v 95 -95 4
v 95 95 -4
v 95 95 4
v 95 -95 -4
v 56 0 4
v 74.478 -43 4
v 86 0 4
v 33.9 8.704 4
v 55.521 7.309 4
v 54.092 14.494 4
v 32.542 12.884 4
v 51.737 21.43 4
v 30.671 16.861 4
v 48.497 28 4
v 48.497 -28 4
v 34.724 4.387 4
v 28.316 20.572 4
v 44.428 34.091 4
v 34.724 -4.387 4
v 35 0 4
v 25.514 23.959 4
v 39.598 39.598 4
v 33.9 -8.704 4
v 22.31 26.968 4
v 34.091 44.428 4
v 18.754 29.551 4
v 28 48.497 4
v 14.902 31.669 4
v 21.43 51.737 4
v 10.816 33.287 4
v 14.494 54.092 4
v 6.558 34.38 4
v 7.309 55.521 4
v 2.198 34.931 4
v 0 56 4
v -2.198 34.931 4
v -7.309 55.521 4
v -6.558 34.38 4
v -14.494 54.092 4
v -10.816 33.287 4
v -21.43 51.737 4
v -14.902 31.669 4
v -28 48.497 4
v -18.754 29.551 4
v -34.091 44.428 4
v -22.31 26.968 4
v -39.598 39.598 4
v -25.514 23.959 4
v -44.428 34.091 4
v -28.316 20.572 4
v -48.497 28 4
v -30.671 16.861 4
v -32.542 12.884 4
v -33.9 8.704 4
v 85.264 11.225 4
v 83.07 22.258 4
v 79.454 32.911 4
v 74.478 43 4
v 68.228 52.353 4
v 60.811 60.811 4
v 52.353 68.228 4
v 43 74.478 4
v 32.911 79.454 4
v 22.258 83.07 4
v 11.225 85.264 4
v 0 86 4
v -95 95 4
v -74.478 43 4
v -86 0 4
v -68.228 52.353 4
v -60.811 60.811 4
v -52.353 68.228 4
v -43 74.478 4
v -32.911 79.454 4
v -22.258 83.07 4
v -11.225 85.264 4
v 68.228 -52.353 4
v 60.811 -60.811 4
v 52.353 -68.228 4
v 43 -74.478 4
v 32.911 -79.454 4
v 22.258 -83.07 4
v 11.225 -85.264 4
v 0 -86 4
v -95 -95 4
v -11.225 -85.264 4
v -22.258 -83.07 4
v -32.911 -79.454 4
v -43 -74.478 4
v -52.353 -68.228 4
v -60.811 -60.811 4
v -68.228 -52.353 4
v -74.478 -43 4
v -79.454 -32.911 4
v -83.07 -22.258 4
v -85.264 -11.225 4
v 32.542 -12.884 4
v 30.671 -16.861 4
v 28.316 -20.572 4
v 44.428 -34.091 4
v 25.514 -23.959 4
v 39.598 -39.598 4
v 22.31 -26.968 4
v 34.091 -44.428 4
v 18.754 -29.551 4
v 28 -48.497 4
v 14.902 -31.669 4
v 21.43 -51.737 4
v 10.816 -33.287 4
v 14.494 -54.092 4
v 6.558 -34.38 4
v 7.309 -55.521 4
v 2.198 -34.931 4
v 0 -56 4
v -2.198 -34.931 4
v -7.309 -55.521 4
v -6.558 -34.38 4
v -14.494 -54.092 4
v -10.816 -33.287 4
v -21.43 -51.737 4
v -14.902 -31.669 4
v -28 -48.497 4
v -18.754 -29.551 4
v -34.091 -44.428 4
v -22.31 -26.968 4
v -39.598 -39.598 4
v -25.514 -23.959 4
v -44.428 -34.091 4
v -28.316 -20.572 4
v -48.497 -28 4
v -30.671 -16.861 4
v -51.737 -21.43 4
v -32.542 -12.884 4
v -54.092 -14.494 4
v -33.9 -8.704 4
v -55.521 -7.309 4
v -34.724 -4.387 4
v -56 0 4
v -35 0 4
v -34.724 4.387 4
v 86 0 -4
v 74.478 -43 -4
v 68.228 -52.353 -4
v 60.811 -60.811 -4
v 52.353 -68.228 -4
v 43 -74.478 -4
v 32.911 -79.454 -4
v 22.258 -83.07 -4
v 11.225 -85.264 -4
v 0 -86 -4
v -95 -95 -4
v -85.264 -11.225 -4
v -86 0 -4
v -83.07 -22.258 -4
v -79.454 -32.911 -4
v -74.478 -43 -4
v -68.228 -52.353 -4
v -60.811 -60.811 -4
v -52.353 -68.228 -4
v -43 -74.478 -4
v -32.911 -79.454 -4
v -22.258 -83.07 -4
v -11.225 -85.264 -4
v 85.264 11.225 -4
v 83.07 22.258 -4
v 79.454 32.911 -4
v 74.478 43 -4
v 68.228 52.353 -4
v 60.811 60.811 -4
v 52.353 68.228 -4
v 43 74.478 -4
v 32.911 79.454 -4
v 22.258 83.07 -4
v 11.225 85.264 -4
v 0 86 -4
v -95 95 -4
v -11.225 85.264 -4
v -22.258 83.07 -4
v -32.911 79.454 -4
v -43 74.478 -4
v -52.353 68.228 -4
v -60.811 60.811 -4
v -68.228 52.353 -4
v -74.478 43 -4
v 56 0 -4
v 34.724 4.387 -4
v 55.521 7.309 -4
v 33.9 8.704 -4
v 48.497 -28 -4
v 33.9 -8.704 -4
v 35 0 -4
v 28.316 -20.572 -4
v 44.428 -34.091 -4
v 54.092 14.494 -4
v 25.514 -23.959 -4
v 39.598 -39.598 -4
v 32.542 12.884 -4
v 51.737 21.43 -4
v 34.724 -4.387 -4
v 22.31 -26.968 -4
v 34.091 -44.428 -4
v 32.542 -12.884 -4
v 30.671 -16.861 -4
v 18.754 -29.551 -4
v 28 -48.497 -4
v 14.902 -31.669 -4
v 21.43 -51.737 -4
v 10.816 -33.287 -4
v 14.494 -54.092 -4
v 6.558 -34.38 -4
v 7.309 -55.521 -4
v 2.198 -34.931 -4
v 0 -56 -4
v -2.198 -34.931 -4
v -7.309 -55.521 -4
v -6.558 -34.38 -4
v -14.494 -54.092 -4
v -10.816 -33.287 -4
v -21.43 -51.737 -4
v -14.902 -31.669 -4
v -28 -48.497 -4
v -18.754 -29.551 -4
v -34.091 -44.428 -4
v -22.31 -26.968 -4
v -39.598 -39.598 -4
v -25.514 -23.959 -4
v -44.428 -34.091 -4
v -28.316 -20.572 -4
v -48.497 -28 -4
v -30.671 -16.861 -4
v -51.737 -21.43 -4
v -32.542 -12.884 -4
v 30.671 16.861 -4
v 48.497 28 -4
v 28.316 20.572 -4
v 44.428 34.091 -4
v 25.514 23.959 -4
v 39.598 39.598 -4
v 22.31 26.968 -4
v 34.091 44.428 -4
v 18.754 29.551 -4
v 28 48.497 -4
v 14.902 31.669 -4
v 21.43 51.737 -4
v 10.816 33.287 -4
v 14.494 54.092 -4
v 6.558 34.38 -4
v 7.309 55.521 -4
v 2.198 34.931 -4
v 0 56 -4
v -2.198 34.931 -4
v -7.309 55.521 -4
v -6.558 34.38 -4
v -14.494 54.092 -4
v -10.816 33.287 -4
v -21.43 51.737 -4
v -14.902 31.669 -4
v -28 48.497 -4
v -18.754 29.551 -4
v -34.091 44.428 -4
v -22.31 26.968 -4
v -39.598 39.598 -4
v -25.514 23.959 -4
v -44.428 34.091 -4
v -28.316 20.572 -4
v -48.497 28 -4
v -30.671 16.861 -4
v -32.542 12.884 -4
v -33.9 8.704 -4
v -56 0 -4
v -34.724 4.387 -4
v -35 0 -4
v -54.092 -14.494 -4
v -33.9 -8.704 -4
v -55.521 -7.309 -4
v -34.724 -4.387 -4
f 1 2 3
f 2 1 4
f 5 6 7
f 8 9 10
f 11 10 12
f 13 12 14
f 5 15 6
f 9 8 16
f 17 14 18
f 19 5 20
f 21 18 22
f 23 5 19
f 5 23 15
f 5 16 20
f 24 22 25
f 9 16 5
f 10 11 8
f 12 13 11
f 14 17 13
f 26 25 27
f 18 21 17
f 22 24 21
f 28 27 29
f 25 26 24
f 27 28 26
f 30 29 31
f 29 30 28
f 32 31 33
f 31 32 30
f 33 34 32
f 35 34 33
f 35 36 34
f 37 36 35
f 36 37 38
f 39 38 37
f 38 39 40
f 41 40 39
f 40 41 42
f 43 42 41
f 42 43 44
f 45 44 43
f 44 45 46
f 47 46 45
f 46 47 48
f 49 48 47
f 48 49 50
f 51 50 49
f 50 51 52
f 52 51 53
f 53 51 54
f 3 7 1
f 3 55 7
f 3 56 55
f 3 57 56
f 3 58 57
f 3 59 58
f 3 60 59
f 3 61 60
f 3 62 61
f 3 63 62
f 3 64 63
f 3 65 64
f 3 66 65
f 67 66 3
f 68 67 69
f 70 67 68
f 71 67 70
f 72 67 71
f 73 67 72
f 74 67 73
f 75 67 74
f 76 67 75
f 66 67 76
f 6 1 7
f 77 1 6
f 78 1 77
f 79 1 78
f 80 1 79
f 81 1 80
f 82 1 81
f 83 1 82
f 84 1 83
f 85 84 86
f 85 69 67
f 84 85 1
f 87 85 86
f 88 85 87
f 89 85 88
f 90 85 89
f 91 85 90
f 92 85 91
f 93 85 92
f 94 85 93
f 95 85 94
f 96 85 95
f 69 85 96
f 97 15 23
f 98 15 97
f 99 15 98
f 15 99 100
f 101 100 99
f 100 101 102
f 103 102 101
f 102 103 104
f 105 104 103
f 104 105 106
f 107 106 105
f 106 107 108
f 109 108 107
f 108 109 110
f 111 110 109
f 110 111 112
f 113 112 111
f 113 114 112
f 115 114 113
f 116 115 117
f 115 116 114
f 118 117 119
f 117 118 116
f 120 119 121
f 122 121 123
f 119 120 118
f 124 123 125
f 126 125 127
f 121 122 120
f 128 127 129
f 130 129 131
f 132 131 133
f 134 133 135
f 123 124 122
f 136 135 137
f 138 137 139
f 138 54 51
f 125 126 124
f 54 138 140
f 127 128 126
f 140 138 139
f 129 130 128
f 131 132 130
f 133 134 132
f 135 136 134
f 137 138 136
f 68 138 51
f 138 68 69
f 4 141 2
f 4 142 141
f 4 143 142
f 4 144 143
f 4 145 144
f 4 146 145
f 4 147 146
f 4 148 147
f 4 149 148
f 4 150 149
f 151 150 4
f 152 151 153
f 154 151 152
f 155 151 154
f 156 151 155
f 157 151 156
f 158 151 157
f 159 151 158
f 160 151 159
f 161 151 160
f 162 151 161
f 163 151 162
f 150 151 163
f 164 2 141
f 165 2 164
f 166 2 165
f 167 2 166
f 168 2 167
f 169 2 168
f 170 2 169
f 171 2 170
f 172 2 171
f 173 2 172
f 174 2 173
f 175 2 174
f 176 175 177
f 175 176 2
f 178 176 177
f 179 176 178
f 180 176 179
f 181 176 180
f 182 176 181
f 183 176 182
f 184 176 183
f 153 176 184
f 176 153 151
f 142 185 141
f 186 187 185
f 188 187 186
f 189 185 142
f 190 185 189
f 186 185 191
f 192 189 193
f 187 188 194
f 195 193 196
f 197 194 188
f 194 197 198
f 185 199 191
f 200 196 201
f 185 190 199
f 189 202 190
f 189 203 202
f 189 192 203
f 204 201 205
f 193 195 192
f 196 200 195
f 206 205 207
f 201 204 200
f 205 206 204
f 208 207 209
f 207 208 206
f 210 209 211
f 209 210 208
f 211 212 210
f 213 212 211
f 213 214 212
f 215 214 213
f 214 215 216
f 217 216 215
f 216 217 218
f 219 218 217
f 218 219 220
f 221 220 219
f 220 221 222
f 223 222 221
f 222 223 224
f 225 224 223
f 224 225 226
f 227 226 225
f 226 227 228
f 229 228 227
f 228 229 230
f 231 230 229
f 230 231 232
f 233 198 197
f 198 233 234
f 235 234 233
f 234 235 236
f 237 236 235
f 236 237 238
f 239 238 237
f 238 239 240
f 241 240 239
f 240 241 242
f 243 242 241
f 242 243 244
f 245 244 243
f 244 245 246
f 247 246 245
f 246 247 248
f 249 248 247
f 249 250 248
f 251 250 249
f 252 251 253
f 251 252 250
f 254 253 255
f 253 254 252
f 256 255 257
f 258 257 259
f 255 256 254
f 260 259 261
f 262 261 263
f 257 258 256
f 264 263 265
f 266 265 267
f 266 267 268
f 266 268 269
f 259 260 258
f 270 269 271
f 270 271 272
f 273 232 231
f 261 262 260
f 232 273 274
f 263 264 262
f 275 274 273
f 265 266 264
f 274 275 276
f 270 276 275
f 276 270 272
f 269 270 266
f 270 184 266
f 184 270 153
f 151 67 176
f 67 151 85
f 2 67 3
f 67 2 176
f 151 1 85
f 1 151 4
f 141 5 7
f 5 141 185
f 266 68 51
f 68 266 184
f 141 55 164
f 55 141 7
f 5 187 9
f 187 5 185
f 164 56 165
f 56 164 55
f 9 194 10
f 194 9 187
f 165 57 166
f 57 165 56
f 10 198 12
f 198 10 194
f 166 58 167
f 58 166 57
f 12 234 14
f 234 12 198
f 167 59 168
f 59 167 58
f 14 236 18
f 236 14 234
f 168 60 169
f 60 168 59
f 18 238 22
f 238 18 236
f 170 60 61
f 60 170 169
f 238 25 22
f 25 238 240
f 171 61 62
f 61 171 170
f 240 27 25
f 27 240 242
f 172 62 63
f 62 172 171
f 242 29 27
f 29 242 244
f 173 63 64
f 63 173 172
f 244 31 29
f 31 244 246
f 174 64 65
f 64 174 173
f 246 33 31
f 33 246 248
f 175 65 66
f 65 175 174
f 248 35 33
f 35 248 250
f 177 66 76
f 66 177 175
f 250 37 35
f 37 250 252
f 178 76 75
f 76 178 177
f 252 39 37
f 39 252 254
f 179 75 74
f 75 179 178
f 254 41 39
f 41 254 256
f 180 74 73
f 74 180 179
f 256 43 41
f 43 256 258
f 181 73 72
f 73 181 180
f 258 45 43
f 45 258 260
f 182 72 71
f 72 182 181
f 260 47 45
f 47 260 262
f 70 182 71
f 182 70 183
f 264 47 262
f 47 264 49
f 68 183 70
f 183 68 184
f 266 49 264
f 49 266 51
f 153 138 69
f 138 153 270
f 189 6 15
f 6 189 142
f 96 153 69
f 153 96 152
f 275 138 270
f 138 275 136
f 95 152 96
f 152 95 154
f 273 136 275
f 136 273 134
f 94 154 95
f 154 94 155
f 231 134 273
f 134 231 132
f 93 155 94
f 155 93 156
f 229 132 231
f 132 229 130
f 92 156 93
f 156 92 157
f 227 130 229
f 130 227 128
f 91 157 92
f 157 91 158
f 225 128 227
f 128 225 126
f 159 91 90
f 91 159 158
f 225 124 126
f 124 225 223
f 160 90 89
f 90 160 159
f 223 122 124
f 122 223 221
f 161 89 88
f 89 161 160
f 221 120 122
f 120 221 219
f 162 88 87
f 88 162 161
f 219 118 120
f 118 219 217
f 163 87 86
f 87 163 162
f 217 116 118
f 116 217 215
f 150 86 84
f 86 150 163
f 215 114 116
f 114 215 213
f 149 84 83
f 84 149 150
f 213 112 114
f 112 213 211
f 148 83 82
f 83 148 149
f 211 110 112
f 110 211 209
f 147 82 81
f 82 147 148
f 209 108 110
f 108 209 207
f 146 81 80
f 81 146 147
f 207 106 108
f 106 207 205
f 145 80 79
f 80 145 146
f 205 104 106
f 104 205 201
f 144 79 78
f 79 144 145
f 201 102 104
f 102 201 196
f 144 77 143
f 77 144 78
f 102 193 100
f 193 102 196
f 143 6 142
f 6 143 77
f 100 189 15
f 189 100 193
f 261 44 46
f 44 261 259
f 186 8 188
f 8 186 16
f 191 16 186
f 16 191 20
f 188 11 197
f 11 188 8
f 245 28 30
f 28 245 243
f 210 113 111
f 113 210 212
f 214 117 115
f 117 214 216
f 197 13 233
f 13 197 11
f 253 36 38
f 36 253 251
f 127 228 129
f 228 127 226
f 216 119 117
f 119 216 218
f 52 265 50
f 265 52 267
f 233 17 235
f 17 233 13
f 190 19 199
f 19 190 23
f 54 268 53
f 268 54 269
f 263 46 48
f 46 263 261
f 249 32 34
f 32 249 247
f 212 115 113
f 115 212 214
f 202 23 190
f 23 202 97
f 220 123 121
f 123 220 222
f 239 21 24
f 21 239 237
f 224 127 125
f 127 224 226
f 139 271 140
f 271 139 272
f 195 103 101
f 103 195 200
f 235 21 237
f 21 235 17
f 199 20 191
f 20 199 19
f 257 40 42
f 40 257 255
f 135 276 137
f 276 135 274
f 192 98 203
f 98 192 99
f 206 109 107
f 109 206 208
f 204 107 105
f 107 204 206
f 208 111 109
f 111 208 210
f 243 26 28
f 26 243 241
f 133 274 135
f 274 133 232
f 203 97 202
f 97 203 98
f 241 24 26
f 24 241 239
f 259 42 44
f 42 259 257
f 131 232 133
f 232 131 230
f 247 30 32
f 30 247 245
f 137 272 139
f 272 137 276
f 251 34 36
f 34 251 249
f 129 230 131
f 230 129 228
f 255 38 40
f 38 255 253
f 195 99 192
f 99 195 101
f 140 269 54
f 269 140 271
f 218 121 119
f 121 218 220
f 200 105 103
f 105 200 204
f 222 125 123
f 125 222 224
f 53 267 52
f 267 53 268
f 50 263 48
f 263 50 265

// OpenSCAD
thickness = 8;
inner_diameter = 150;
frame_width = 190;

center_hole_diameter = 70;

router_width = 30;
angle = 150;

$fn = 50;

module index()
{
	difference()
	{
		cube([ frame_width, frame_width, thickness ], center = true);

		rotate_extrude(angle = angle) translate([ (inner_diameter / 2) - (thickness / 2), 0, 0 ])
		square(size = [ router_width, thickness ], center = true);

		rotate([ 0, 0, 180 ])
		rotate_extrude(angle = angle) translate([ (inner_diameter / 2) - (thickness / 2), 0, 0 ])
		square(size = [ router_width, thickness ], center = true);

		cylinder(d = center_hole_diameter, h = thickness, center = true);
	}
}

index();
